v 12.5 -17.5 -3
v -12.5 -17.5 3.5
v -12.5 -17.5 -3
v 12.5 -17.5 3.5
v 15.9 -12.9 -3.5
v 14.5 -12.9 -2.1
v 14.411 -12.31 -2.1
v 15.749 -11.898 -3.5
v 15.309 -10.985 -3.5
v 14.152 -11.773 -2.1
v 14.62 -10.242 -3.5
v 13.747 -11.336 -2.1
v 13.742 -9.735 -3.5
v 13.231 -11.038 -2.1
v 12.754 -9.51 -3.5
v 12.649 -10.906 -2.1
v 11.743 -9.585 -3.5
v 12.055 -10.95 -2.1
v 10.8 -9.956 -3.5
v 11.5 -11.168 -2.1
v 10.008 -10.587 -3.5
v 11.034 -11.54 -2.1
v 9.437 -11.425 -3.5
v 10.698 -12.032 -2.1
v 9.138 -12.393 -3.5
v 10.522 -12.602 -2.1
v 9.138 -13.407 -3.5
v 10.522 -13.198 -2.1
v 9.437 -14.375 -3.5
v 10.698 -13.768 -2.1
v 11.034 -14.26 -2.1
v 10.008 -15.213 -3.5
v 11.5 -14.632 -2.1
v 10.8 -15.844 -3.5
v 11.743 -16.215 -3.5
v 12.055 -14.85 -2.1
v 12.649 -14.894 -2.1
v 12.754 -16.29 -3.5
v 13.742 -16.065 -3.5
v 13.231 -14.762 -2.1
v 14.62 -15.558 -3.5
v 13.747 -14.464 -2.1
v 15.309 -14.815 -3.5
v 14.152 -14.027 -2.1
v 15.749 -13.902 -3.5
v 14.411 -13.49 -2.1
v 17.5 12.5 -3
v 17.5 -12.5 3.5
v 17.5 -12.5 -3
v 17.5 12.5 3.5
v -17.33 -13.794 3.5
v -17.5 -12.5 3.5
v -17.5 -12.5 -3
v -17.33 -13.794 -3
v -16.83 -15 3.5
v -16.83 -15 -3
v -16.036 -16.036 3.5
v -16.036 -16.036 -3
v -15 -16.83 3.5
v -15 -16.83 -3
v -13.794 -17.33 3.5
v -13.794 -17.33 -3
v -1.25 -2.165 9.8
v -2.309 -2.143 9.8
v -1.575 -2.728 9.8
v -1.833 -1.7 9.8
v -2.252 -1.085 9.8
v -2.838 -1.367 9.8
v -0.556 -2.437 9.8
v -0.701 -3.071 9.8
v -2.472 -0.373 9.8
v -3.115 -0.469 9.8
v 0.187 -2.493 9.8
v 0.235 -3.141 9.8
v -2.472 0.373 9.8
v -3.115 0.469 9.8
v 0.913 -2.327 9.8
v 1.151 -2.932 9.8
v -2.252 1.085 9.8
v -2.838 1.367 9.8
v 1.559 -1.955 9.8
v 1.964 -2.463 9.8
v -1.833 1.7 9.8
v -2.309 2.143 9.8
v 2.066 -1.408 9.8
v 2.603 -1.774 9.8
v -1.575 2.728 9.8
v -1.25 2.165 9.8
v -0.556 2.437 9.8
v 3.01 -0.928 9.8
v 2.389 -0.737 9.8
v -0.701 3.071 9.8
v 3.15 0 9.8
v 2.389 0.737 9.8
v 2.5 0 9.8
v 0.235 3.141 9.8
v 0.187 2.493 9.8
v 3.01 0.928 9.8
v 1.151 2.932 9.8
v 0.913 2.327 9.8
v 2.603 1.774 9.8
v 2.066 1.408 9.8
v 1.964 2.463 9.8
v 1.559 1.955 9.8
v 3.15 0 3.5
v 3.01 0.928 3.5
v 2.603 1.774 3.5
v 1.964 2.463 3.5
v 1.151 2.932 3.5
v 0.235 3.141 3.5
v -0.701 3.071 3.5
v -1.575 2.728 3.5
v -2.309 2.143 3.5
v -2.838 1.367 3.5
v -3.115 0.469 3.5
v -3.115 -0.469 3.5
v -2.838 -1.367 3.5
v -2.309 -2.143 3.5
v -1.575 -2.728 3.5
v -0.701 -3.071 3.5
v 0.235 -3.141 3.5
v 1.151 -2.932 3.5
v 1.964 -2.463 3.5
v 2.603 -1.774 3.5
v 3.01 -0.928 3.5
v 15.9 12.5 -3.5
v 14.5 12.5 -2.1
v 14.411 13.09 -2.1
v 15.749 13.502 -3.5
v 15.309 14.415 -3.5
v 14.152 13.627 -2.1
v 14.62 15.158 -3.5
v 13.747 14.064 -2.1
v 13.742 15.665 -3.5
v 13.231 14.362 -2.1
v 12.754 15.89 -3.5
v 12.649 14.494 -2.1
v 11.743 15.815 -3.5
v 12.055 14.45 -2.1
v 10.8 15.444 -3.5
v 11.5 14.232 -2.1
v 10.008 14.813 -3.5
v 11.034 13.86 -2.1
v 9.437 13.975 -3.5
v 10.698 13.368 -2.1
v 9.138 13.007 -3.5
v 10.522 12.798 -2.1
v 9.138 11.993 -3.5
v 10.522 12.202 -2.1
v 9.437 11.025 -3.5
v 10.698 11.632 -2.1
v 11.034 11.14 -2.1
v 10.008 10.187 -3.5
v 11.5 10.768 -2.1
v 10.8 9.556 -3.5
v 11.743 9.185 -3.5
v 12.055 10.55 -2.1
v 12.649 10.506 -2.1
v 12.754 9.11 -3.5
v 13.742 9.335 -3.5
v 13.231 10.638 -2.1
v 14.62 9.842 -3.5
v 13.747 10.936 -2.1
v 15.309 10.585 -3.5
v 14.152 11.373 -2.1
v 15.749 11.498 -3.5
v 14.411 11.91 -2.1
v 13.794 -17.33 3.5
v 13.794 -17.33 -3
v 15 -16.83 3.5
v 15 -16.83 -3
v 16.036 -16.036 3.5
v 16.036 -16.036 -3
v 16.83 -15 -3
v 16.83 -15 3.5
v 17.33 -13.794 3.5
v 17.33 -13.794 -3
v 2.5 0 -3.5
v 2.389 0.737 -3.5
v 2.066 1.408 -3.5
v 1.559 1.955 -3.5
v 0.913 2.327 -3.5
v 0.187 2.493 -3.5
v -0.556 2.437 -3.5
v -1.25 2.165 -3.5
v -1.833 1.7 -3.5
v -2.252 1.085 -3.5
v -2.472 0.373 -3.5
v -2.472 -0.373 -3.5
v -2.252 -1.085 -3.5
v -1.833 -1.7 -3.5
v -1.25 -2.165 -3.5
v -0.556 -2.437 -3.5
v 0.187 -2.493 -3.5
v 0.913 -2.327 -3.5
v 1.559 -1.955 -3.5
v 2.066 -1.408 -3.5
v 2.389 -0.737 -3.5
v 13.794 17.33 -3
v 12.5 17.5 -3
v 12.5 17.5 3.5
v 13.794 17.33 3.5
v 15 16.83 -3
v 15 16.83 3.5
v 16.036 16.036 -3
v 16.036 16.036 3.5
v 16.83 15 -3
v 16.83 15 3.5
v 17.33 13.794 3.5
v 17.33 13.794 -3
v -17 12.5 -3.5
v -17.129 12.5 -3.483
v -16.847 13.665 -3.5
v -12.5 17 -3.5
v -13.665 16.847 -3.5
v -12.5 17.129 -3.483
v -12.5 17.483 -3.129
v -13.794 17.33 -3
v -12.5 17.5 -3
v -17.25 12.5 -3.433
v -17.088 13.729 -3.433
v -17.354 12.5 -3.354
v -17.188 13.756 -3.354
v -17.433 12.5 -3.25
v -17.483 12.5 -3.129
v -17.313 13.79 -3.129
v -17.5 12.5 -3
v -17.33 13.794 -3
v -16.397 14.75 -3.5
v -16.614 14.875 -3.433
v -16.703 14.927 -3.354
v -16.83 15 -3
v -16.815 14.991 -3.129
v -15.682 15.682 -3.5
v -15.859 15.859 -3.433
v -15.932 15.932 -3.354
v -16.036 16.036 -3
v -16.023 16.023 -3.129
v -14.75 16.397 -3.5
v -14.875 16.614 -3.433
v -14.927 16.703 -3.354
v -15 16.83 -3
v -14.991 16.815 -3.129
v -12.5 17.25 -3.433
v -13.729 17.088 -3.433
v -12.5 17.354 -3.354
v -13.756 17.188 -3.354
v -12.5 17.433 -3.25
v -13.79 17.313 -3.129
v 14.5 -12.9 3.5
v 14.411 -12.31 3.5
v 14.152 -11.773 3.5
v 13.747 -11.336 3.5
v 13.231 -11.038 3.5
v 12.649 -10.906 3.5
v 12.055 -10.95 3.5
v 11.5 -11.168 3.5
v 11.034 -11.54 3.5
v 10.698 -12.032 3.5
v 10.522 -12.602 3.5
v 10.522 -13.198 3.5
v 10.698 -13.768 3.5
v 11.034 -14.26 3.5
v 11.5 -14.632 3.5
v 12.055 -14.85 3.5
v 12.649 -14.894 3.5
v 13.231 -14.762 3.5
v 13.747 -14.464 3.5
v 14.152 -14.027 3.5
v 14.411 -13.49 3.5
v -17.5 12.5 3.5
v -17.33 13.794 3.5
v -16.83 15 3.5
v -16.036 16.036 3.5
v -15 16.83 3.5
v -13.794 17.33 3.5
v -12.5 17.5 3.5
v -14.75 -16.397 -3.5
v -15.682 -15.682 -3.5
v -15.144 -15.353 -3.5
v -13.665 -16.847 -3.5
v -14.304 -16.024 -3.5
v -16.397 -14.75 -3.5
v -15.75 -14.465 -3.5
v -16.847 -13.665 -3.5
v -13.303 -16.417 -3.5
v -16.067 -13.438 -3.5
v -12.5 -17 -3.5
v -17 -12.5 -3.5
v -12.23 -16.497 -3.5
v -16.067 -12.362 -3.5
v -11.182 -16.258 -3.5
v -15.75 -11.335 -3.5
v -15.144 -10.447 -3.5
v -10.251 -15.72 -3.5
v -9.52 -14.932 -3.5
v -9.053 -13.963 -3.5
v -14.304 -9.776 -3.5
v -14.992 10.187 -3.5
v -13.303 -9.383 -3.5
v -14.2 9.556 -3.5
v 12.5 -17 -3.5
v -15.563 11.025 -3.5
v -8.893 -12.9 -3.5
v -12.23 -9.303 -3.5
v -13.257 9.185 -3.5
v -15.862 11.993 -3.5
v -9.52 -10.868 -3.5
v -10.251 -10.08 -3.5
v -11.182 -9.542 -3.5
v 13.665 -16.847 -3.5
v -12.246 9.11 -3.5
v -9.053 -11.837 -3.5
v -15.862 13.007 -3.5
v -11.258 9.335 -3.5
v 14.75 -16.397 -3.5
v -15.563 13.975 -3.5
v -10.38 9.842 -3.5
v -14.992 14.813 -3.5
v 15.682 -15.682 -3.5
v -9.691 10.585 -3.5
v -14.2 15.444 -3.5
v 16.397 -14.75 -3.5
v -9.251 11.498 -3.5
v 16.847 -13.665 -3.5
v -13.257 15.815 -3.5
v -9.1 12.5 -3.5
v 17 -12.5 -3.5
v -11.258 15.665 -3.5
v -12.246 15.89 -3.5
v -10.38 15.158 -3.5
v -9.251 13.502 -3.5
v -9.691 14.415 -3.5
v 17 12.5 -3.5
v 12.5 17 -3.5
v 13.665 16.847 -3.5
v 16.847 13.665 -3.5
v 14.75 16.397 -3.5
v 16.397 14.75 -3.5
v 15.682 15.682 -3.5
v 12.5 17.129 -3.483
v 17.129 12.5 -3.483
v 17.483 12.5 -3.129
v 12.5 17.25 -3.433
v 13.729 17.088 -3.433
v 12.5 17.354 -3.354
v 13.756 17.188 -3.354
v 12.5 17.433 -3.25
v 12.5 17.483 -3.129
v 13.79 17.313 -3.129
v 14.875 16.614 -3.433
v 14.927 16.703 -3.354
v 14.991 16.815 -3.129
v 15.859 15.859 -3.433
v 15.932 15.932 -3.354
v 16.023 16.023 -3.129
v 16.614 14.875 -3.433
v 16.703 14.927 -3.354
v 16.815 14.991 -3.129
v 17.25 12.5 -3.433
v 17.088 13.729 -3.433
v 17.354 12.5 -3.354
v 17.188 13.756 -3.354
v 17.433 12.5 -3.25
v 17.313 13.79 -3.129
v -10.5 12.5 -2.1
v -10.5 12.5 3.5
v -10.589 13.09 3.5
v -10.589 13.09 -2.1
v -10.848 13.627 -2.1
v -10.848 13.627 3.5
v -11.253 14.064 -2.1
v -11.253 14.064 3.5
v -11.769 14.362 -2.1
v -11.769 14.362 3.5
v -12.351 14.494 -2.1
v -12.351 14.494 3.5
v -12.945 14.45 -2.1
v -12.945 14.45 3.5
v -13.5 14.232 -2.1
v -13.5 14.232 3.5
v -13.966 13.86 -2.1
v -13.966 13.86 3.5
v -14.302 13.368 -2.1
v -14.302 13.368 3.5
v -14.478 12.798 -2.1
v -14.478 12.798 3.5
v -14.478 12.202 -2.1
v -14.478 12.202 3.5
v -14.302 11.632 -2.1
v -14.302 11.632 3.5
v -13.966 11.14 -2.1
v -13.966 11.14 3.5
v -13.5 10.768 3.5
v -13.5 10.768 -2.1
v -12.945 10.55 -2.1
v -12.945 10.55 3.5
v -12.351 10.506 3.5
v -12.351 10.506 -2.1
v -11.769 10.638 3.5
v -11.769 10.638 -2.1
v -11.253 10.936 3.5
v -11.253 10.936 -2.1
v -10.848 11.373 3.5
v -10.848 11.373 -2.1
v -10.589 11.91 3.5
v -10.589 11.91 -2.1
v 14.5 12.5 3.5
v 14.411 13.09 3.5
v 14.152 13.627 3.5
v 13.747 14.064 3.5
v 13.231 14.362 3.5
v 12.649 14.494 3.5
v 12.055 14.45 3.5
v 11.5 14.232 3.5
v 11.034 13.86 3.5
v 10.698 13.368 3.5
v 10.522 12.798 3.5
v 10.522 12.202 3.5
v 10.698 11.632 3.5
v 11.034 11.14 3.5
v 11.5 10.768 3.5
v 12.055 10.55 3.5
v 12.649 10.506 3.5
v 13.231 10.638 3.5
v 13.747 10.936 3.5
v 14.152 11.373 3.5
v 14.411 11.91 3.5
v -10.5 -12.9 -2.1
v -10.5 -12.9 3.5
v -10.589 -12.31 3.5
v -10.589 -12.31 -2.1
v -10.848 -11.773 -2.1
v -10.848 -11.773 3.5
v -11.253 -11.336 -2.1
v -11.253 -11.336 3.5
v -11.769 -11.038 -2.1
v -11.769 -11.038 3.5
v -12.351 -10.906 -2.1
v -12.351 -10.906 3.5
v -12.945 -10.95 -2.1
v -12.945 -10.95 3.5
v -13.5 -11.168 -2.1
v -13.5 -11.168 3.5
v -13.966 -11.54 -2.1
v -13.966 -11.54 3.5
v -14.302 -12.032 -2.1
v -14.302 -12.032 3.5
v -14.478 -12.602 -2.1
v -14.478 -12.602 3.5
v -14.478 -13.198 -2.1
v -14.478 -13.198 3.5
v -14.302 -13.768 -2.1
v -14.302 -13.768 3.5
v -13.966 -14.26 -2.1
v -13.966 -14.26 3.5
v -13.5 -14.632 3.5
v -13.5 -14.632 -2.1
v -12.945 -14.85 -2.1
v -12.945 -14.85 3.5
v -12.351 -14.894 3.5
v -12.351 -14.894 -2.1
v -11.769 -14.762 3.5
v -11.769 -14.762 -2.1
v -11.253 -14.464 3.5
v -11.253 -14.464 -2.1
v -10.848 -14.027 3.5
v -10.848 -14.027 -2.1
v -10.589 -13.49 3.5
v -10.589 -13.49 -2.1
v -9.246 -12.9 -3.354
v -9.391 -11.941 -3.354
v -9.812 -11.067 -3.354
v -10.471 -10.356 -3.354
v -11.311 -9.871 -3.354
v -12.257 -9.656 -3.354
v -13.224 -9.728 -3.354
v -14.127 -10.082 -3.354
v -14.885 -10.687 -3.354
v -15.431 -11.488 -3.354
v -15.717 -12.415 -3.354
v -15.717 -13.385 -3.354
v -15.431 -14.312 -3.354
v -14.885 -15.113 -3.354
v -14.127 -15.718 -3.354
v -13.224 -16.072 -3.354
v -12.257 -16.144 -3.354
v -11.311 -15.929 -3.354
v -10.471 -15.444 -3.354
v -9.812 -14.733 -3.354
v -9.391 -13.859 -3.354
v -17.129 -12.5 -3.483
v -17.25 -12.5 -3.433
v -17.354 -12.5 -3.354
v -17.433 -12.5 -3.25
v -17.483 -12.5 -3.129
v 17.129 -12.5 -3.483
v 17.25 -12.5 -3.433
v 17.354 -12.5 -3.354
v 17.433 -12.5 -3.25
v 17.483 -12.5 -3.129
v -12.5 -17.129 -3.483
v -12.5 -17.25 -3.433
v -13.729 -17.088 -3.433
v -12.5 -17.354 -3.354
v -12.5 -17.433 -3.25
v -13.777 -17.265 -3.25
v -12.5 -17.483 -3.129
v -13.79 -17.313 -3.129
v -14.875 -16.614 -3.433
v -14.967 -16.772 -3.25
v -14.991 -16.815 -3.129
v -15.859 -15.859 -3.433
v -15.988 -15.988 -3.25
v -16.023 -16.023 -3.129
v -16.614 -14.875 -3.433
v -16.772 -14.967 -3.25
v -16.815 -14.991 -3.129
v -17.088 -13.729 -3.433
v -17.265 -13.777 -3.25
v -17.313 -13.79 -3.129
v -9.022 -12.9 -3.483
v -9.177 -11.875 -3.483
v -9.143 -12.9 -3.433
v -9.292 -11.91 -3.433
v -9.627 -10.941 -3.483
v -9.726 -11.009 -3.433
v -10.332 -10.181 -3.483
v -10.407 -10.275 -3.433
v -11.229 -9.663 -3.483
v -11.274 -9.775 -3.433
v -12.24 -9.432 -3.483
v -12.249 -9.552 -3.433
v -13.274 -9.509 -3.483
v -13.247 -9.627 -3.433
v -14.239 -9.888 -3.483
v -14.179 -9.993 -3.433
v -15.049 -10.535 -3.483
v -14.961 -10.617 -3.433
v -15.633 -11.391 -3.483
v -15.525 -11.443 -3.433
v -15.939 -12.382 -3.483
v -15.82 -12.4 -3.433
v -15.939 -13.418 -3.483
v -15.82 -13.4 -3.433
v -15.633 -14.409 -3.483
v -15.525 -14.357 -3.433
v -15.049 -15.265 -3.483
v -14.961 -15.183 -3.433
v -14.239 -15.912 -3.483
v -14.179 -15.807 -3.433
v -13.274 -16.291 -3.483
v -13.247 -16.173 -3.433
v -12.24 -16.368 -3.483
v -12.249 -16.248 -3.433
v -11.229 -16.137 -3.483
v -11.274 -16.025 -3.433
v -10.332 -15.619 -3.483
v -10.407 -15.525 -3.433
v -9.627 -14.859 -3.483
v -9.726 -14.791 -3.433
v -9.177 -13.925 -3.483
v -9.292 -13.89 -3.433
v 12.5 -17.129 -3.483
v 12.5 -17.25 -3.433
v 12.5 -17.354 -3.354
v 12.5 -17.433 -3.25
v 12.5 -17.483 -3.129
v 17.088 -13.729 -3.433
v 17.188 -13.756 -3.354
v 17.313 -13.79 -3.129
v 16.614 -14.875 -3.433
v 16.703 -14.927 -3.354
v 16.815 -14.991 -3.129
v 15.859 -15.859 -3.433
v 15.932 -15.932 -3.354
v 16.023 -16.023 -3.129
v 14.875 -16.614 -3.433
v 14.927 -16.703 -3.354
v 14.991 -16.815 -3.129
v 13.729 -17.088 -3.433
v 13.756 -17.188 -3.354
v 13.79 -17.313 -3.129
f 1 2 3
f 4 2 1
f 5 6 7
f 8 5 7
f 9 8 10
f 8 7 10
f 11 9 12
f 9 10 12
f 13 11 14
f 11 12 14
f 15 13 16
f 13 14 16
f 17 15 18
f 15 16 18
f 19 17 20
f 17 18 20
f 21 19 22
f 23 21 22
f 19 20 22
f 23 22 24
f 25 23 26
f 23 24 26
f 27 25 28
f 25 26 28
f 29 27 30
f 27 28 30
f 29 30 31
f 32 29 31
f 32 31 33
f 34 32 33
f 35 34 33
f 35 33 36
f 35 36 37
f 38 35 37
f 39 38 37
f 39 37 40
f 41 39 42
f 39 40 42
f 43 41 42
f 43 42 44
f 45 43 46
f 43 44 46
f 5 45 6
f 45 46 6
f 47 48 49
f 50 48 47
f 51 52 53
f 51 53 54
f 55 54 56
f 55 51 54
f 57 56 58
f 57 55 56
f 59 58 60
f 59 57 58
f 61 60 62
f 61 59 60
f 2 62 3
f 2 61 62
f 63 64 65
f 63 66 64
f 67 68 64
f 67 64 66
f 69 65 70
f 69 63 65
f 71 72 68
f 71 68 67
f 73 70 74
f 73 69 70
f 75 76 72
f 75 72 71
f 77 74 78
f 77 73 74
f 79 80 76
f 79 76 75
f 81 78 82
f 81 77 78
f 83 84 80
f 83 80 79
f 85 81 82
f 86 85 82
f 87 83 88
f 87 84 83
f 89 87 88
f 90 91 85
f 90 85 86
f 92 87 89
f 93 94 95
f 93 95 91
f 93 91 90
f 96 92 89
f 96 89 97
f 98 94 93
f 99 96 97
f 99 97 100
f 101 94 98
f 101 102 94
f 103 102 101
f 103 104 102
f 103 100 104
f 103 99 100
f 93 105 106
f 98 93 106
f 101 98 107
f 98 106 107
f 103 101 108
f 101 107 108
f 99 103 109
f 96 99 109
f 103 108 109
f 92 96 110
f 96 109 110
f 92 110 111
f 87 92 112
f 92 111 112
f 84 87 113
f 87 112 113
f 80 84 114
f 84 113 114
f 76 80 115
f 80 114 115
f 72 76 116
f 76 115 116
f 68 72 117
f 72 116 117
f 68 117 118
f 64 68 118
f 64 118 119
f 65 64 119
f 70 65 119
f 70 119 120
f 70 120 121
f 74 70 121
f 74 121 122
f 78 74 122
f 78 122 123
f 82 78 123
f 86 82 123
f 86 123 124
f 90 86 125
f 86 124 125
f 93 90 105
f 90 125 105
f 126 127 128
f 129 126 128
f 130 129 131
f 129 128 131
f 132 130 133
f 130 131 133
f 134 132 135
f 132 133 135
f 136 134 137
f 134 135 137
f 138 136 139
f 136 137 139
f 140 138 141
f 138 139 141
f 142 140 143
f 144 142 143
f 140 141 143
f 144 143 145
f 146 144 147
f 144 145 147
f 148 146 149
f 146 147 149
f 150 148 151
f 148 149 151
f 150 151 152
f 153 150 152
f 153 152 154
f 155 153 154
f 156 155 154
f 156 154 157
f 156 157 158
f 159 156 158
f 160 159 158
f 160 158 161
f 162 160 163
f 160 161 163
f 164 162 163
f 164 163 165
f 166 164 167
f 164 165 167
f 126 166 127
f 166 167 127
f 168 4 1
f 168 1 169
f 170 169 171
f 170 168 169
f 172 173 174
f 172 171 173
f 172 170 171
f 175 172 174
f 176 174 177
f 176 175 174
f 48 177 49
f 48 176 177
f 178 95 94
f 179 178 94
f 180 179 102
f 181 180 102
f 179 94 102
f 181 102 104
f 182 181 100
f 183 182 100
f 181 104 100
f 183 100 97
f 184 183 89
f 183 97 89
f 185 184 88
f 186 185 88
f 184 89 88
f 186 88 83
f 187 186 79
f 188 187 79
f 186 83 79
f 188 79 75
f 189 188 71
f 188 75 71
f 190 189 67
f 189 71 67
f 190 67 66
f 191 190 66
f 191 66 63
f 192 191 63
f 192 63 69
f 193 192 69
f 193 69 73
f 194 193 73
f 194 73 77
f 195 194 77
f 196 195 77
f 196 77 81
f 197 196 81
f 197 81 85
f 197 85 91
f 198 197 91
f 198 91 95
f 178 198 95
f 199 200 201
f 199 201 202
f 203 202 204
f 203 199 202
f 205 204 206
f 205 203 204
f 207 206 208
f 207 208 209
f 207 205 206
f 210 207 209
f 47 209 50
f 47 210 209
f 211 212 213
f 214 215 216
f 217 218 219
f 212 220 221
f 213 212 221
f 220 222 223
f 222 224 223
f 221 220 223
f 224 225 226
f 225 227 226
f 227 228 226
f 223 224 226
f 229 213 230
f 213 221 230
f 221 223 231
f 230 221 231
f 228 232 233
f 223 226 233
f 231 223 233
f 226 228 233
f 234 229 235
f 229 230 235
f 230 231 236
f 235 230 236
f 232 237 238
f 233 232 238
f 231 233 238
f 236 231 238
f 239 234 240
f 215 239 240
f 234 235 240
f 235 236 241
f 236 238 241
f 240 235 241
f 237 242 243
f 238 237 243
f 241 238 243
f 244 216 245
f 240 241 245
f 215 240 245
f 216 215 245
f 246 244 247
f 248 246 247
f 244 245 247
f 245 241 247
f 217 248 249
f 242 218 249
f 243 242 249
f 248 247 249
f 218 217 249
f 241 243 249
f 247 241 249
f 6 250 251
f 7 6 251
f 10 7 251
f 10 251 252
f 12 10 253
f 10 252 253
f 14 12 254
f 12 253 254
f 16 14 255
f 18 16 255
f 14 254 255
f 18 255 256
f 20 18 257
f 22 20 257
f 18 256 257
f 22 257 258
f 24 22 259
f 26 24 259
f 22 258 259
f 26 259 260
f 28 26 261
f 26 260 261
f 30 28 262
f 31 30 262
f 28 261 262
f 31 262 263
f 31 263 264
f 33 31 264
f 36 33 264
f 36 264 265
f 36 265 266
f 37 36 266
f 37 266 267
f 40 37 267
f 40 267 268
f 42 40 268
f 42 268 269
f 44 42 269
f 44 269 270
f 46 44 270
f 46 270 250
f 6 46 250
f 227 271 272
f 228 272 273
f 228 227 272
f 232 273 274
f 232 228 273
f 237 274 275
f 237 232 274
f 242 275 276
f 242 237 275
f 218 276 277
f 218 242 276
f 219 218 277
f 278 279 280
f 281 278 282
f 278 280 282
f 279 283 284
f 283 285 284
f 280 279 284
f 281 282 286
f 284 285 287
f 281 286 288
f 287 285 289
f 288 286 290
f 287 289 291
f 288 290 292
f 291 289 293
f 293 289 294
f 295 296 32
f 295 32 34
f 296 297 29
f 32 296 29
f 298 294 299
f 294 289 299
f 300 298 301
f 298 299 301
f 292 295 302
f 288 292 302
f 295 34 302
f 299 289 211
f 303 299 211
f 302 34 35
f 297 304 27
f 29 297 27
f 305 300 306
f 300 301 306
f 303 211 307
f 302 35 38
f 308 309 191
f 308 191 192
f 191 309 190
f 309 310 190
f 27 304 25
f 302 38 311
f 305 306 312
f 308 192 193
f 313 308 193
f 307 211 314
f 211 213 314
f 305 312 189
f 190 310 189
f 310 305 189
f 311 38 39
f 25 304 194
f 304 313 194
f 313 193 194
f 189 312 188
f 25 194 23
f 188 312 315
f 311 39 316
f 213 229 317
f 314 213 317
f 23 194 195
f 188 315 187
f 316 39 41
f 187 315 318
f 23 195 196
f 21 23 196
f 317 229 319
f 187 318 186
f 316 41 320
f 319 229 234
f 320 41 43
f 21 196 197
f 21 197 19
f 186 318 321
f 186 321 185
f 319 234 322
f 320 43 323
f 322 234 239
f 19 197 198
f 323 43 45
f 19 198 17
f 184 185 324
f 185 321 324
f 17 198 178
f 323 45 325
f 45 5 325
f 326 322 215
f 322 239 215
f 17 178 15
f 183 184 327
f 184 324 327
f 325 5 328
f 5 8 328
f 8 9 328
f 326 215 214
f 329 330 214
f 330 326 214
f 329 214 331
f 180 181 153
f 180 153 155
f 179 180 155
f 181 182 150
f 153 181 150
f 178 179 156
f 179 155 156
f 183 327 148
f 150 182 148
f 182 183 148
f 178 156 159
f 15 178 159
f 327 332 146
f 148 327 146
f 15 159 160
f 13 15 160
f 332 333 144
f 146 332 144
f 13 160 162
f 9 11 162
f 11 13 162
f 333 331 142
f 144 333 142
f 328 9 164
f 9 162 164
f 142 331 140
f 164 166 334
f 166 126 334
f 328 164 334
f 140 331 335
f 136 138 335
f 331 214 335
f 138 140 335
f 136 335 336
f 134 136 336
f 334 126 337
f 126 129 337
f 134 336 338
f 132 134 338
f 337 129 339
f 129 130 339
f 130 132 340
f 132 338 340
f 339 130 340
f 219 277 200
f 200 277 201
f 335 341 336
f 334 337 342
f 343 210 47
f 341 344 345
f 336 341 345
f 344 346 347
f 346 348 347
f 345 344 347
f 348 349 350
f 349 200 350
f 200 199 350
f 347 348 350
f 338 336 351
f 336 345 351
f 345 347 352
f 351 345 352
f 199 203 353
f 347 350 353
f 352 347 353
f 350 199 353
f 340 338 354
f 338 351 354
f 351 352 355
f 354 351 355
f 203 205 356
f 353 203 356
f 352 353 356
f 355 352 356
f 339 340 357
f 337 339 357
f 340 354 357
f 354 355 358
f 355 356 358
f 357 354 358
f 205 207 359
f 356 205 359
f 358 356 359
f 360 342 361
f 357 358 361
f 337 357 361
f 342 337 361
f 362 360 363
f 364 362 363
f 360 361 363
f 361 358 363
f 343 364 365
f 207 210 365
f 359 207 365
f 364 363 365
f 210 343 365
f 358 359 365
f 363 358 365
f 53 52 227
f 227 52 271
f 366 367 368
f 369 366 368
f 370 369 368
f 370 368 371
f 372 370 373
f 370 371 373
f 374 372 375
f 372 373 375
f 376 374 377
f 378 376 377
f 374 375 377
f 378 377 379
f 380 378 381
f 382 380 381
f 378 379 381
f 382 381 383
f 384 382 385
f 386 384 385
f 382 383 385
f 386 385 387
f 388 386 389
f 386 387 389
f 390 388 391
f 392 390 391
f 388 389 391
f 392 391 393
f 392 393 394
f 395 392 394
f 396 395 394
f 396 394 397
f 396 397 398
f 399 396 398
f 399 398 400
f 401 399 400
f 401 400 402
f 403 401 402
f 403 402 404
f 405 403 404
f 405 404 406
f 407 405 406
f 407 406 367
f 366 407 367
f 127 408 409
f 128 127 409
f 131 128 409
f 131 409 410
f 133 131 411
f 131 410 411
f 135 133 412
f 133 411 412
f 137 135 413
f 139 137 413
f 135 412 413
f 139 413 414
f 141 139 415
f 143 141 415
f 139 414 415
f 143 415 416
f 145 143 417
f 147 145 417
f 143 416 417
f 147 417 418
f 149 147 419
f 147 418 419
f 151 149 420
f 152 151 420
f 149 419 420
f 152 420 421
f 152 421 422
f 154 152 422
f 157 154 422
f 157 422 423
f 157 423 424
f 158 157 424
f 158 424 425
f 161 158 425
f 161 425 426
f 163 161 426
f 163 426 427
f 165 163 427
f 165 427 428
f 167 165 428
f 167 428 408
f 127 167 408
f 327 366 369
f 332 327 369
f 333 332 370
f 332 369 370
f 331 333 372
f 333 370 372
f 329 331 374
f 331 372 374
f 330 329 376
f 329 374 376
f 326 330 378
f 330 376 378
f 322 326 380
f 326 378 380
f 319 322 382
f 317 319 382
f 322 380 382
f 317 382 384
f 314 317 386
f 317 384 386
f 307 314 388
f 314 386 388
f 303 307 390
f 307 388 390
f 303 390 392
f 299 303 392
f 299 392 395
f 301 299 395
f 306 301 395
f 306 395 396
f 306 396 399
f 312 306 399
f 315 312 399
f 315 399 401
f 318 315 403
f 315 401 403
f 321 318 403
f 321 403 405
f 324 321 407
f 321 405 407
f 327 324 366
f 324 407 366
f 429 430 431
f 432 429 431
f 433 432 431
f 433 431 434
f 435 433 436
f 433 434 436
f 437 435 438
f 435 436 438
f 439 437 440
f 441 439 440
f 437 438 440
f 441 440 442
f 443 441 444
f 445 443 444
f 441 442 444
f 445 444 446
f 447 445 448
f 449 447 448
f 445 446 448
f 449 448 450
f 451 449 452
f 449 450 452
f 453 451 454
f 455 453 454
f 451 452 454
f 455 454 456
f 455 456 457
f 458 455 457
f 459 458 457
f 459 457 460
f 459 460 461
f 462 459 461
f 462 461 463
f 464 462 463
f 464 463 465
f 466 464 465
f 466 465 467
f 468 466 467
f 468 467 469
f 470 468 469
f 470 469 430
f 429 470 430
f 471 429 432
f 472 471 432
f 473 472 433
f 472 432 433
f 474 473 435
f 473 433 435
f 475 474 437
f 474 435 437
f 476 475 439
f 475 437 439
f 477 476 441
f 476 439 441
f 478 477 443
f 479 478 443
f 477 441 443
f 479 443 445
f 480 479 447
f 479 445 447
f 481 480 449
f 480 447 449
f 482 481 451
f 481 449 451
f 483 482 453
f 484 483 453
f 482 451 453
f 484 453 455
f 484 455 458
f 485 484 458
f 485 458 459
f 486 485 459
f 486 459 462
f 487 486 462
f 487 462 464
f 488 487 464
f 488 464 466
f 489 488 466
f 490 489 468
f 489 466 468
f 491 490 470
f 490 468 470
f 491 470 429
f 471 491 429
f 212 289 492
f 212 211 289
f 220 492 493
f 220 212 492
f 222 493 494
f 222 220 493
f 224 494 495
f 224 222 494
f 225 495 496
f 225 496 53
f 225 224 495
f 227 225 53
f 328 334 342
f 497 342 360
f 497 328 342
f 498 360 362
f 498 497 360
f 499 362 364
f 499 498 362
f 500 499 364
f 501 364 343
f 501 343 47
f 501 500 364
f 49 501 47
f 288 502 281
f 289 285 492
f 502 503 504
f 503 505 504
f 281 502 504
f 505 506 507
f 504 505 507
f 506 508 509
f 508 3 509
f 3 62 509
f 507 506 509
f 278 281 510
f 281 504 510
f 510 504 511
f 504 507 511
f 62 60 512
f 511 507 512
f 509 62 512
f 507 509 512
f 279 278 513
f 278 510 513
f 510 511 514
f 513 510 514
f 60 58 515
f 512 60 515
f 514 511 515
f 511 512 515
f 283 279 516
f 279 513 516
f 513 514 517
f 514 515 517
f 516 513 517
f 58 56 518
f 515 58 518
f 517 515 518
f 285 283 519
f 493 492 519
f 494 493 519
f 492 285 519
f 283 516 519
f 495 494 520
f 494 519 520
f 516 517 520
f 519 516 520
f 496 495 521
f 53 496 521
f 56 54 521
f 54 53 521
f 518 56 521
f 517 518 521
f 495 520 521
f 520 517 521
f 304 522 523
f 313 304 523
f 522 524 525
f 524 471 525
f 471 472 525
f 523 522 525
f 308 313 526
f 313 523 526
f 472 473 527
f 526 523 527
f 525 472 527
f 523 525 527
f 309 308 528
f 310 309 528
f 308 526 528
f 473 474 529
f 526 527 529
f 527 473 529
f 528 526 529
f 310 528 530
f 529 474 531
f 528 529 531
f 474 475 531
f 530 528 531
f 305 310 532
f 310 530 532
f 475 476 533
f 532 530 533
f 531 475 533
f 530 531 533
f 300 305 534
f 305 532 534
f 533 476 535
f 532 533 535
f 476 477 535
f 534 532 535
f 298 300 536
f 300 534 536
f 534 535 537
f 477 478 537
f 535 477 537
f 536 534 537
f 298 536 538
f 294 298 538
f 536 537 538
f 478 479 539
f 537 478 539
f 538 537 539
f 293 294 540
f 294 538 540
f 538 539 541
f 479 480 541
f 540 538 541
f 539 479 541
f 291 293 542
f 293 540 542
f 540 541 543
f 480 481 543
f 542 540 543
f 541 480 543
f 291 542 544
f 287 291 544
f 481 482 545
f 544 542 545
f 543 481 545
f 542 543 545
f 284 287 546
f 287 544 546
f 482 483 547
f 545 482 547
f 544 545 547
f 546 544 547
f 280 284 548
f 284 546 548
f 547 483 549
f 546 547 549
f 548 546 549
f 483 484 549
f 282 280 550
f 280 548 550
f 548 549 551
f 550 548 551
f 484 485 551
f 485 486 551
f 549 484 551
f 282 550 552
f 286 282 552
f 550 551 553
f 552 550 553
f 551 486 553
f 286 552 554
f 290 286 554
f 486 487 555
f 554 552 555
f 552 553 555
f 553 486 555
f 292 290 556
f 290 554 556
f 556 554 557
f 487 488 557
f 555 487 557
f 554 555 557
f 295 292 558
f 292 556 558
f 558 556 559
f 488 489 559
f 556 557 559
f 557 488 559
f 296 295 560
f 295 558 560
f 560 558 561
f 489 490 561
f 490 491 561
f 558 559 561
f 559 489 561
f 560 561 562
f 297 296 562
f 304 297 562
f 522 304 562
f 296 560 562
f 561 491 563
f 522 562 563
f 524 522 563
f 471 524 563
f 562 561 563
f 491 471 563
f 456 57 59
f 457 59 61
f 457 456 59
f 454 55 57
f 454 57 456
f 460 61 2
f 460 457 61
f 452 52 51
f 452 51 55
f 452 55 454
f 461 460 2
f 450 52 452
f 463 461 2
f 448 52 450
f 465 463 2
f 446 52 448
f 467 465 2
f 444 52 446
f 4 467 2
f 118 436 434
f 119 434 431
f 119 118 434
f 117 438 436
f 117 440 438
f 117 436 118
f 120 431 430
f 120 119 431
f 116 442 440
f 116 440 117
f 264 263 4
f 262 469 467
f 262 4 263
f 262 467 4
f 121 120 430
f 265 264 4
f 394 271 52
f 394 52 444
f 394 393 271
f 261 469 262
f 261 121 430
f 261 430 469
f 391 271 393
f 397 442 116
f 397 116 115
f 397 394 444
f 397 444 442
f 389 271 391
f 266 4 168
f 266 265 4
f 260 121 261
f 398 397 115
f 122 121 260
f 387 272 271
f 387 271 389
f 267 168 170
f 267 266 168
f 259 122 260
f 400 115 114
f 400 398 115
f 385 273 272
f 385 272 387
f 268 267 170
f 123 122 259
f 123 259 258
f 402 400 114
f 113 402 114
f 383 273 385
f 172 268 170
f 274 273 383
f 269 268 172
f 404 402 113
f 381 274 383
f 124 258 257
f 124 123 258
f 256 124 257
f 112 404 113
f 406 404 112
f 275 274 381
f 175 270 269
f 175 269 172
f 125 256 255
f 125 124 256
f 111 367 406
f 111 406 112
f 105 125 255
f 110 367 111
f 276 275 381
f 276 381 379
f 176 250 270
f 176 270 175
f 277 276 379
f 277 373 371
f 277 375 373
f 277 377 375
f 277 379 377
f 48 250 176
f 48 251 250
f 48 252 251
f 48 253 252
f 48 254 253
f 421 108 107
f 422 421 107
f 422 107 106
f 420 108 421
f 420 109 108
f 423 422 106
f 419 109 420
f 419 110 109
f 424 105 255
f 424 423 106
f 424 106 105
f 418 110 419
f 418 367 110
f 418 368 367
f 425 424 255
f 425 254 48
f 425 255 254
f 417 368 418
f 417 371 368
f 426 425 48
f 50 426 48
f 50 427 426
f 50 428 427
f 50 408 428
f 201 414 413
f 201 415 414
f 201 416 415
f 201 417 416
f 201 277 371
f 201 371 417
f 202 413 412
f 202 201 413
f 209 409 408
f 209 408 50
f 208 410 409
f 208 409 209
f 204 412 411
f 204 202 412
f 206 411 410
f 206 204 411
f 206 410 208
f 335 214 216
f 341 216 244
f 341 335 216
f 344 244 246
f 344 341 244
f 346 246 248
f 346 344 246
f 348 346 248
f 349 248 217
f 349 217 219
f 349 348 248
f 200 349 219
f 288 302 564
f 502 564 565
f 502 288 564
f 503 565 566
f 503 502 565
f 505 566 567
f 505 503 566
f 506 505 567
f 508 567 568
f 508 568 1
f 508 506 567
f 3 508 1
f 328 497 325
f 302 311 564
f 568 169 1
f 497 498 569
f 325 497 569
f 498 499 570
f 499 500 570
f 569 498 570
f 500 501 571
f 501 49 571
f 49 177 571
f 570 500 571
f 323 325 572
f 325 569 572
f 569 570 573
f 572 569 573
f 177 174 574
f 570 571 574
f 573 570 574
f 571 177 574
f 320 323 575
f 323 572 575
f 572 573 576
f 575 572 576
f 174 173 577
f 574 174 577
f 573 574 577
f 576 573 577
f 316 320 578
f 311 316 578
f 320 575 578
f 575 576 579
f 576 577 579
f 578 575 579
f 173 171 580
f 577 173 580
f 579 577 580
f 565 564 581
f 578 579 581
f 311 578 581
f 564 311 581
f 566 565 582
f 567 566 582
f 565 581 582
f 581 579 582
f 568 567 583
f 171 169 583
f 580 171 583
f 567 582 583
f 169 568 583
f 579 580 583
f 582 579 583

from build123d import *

# Parameters (mm, degrees)
F0_W     = 35
F0_H     = 35
F1_DEPTH = 3.5
F2_R     = 2
F3_DEPTH = 7.001
F4_R     = 5
F5_R     = 3.15
F6_DEPTH = 6.3
F7_R     = 2.5
F8_DEPTH = 13.301
F9_SIZE  = 1.4
F10_R    = 0.5


with BuildPart() as f1:
    # F0 (on Top) → F1 (new body, symmetric)
    with BuildSketch(Plane.XY):
        Rectangle(F0_W, F0_H)
    extrude(amount=F1_DEPTH, both=True)

    # F2 (on face) → F3 (cut, through all)
    with BuildSketch(Plane.XY.offset(3.5)):
        with Locations((-12.5, -12.9)):
            Circle(F2_R)
        with Locations((-12.5, 12.5)):
            Circle(F2_R)
        with Locations((12.5, 12.5)):
            Circle(F2_R)
        with Locations((12.5, -12.9)):
            Circle(F2_R)
    extrude(amount=-F3_DEPTH, mode=Mode.SUBTRACT)

    # F4
    f4_edges = [f1.edges().sort_by_distance(p)[0] for p in [
        (-17.5, 17.5, 0),
        (17.5, 17.5, 0),
        (17.5, -17.5, 0),
        (-17.5, -17.5, 0),
    ]]
    fillet(f4_edges, radius=F4_R)

    # F5 (on face) → F6 (join)
    with BuildSketch(Plane.XY.offset(3.5)):
        Circle(F5_R)
    extrude(amount=F6_DEPTH)

    # F7 (on face) → F8 (cut, through all)
    with BuildSketch(Plane.XY.offset(9.8)):
        Circle(F7_R)
    extrude(amount=-F8_DEPTH, mode=Mode.SUBTRACT)

    # F9
    f9_edges = [f1.edges().sort_by_distance(p)[0] for p in [
        (-14.5, -12.9, -3.5),
        (10.5, -12.9, -3.5),
        (10.5, 12.5, -3.5),
        (-14.5, 12.5, -3.5),
    ]]
    chamfer(f9_edges, length=F9_SIZE)

    # F10
    f10_edges = [f1.edges().sort_by_distance(p)[0] for p in [
        (-15.9, -12.9, -3.5),
        (-17.5, 0, -3.5),
    ]]
    fillet(f10_edges, radius=F10_R)


solid = f1.part
